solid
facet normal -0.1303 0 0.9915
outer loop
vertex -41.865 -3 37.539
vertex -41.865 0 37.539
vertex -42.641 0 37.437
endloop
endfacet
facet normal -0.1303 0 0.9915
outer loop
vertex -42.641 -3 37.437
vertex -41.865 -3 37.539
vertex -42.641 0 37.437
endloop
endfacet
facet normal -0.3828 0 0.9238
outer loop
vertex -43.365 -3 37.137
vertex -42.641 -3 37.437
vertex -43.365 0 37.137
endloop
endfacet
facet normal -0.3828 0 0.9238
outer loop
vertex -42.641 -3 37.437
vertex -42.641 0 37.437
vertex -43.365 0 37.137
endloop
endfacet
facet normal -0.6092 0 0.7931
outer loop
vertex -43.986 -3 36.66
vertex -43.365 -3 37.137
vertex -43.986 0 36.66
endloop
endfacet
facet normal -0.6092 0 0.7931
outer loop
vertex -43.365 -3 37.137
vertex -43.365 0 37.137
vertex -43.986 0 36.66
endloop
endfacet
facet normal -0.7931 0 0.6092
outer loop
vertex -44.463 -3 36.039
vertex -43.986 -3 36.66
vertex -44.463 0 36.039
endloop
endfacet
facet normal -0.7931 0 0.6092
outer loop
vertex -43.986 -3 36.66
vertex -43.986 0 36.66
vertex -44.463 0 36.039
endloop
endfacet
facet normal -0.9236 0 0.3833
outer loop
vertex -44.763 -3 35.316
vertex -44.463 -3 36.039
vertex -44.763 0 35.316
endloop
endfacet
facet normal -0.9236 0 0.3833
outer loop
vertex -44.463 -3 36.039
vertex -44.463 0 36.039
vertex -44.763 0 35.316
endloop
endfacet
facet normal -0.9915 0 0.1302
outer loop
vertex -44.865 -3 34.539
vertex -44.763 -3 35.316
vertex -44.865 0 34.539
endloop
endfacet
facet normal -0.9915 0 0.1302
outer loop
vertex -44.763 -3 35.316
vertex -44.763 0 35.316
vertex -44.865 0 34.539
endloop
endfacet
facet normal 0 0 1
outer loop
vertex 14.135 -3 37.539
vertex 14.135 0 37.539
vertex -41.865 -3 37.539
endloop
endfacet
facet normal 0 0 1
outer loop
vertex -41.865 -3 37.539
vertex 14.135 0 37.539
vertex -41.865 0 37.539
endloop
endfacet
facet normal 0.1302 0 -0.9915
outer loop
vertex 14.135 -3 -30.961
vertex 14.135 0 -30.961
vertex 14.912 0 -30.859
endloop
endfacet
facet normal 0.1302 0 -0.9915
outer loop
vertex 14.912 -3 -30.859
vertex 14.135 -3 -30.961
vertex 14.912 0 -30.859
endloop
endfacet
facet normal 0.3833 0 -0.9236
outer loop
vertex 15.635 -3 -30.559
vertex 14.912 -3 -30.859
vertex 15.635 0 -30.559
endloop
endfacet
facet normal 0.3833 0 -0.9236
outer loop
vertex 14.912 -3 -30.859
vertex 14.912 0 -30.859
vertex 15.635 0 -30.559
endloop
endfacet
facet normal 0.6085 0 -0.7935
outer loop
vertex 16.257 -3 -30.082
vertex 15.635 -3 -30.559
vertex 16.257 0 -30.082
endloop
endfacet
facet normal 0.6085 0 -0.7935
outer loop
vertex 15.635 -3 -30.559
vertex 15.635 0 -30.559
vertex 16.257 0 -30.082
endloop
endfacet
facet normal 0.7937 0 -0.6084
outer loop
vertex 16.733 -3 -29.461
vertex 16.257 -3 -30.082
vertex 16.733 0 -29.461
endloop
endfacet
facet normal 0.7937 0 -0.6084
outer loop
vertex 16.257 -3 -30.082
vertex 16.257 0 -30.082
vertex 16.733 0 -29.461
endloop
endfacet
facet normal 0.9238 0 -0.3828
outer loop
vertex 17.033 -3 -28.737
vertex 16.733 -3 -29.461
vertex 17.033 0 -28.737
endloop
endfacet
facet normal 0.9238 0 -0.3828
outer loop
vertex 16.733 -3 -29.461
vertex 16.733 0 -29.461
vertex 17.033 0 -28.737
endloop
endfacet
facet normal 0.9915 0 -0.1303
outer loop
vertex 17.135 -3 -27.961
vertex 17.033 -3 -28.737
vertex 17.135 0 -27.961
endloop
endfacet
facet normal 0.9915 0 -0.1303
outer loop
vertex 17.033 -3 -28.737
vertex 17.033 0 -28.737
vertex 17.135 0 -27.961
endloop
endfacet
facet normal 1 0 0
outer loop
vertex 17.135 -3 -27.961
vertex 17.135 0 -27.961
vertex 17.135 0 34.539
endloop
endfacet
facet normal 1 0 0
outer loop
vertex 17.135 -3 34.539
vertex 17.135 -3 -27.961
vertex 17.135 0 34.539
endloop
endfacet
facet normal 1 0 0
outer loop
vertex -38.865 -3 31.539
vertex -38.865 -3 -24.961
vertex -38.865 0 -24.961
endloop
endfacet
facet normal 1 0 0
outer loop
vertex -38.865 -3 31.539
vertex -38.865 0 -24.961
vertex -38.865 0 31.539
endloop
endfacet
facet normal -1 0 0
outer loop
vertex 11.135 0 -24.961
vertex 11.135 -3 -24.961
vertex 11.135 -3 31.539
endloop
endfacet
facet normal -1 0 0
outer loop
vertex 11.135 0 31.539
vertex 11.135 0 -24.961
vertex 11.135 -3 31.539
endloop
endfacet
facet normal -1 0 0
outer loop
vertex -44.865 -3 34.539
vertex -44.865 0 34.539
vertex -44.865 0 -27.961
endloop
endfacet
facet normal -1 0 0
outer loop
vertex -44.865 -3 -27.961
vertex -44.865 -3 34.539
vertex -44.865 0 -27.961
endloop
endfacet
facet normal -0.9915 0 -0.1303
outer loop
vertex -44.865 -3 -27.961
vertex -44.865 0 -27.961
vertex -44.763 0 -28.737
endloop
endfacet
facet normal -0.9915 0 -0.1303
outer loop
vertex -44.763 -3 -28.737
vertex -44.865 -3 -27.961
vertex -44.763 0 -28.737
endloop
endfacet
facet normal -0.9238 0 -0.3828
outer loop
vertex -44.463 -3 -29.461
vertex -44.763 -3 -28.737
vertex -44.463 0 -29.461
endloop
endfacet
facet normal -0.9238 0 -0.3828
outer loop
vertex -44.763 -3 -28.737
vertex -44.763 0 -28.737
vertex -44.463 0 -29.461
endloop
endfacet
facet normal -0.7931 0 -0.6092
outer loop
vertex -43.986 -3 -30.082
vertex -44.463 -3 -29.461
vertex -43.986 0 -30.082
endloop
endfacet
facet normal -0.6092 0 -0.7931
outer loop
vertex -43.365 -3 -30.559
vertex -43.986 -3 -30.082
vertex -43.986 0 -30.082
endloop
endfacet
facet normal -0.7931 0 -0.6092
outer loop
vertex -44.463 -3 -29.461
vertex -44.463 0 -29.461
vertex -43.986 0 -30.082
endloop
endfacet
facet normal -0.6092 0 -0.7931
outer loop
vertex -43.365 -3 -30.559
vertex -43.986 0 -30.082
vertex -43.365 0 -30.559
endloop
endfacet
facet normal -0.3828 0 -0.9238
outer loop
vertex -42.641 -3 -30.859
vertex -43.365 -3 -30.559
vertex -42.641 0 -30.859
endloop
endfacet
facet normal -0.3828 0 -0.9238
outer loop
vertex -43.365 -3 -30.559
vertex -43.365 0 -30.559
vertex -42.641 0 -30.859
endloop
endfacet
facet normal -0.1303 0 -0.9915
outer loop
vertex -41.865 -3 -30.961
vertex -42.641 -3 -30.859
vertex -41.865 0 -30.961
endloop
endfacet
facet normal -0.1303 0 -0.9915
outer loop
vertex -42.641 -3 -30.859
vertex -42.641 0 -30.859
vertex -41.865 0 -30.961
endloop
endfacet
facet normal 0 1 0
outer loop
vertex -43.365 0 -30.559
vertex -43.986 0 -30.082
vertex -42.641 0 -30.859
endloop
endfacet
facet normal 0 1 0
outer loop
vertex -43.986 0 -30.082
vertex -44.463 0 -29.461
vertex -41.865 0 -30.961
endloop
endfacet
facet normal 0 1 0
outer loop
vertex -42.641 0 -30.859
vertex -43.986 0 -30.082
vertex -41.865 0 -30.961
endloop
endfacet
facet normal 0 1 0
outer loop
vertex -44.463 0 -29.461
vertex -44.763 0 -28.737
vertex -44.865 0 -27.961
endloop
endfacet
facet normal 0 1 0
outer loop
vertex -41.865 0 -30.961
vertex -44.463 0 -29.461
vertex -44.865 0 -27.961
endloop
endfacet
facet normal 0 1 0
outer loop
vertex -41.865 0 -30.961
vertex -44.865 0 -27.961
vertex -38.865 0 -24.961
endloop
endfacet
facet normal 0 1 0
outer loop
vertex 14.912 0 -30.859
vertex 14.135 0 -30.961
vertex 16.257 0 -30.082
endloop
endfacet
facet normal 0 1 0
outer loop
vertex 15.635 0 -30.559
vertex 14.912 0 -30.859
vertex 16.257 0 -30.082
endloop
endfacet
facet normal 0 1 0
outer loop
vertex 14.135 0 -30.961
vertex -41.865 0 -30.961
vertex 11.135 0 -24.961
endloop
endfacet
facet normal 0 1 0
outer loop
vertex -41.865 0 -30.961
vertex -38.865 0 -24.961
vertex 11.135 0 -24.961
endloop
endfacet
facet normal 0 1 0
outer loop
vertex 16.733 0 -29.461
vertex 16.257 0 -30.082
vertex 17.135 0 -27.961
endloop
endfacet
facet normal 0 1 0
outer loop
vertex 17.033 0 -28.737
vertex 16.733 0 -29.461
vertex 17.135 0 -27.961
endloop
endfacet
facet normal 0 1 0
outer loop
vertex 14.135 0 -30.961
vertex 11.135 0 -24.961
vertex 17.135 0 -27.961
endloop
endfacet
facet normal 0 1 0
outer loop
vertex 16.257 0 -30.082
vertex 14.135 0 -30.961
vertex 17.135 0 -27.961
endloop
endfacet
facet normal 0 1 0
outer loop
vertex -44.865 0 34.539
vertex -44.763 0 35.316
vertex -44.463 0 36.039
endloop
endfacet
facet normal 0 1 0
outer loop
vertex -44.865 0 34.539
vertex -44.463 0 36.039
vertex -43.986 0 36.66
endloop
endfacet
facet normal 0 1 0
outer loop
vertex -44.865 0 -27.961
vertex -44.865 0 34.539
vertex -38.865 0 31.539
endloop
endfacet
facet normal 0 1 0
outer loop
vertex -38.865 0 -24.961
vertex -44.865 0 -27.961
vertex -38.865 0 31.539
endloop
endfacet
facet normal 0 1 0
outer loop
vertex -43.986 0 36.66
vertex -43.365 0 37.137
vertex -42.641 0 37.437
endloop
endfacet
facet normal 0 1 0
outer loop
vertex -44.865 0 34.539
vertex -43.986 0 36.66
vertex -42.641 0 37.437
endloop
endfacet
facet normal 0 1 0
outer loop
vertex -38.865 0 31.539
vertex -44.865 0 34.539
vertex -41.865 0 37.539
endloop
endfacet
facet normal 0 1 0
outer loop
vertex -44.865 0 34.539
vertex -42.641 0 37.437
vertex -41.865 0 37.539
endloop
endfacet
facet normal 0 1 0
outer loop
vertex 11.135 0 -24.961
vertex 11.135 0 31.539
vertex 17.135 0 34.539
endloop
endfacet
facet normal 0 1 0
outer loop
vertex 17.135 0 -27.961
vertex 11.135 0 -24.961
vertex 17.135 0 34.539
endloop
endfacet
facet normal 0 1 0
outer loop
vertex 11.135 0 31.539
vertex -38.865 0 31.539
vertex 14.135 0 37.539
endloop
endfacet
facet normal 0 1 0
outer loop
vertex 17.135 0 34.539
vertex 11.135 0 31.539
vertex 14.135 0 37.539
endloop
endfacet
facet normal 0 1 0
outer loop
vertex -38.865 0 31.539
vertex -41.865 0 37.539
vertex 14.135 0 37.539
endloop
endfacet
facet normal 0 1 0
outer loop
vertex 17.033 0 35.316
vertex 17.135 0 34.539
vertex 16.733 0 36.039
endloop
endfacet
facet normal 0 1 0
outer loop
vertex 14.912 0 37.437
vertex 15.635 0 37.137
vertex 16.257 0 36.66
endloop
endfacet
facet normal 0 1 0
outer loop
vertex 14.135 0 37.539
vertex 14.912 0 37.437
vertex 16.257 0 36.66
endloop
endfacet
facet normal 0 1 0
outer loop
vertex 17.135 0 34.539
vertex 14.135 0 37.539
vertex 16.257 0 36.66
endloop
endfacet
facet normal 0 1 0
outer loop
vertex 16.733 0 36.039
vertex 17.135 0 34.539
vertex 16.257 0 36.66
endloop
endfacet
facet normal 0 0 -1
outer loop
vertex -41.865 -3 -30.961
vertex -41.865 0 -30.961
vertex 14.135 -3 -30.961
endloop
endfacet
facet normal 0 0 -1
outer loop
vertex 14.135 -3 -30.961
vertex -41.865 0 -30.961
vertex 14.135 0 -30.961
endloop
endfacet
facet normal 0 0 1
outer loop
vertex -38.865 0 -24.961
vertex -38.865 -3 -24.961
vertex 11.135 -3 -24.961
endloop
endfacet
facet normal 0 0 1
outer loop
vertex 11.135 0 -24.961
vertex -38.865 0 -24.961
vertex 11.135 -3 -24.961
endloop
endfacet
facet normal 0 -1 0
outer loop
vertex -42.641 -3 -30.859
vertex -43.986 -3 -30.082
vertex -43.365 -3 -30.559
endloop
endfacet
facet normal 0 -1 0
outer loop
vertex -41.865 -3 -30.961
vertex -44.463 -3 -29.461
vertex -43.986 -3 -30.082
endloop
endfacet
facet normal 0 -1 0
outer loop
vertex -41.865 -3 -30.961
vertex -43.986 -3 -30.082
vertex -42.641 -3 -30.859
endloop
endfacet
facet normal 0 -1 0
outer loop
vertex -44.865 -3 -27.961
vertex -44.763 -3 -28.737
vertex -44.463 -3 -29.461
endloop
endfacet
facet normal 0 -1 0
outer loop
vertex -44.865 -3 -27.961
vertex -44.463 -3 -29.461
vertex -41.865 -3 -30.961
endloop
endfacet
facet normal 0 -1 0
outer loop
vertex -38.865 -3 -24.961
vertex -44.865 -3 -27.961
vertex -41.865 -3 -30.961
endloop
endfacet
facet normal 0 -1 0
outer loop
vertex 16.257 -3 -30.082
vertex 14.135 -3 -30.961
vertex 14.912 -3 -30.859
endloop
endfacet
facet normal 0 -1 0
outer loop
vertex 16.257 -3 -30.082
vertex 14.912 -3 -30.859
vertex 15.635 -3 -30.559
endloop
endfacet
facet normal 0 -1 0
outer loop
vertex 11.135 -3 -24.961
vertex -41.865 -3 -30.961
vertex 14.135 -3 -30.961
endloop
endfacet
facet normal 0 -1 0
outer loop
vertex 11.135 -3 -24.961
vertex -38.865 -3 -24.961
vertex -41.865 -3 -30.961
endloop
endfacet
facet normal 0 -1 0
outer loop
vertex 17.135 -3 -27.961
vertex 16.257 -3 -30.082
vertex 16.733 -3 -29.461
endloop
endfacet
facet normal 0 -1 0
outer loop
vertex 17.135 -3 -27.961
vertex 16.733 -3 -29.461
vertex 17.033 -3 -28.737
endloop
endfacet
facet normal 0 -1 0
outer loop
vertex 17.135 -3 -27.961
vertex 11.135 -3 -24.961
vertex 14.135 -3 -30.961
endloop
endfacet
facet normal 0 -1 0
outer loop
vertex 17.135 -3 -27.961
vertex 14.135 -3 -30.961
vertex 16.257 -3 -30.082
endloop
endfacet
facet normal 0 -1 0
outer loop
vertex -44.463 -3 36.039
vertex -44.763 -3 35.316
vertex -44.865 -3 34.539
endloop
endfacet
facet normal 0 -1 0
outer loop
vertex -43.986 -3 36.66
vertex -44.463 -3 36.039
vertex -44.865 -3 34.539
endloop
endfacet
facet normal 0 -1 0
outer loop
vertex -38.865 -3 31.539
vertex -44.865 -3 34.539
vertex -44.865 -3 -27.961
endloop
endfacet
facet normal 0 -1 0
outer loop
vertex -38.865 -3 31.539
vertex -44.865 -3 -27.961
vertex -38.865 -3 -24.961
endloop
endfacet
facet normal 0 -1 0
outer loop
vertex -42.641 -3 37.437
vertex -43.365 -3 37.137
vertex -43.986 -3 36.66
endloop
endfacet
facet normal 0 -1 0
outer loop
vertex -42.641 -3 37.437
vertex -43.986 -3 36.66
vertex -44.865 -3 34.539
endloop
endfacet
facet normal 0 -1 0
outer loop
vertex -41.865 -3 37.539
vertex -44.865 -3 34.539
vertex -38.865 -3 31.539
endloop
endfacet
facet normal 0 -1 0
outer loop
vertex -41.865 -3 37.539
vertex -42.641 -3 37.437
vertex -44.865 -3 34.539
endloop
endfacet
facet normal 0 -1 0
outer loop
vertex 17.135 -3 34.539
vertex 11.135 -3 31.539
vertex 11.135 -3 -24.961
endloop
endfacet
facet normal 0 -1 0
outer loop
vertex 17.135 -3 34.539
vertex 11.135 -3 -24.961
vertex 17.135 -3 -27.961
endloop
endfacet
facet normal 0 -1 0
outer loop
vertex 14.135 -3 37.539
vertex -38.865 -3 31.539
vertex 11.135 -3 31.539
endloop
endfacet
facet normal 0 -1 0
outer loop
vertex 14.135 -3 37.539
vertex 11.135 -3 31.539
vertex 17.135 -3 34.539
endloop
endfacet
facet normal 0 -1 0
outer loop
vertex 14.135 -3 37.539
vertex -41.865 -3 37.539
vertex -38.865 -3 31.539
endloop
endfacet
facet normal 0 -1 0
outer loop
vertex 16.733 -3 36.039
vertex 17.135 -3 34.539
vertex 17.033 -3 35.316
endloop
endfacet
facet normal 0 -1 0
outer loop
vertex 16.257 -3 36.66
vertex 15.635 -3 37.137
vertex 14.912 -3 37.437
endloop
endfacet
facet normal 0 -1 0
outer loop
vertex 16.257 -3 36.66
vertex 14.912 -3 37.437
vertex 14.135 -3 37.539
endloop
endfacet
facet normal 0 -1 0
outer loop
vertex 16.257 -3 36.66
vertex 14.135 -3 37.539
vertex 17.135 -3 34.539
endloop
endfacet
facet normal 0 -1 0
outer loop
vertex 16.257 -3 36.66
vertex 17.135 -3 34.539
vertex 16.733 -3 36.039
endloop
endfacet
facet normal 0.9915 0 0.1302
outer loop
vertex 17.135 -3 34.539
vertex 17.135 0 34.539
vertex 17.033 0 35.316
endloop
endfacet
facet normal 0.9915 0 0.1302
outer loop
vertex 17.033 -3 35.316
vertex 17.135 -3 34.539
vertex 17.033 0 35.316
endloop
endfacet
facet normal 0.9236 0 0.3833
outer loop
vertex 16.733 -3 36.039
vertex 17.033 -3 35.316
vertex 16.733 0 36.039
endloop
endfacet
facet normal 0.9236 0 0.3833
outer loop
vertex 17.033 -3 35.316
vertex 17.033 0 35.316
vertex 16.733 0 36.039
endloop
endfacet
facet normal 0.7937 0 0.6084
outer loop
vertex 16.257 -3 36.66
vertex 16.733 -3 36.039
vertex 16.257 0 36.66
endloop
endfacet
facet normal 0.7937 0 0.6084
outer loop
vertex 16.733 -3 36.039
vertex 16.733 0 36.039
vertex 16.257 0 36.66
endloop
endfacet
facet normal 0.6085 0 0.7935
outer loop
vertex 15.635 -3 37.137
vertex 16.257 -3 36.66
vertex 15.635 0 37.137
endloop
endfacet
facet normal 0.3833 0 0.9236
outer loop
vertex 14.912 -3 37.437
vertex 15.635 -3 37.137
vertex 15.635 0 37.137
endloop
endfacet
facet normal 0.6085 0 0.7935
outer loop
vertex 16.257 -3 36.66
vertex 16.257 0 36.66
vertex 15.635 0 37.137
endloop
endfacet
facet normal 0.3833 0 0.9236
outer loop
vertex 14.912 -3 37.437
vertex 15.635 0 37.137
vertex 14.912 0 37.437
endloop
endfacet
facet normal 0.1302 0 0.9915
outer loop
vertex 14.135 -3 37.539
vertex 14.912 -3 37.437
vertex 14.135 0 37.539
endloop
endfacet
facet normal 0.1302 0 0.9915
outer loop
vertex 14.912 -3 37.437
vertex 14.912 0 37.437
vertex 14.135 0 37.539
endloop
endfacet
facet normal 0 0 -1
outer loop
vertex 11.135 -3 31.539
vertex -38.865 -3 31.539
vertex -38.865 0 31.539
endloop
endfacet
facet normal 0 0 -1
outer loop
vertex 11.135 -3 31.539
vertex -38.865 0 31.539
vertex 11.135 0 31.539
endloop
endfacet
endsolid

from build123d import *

# Parameters (mm, degrees)
F1_DEPTH = 3
F2_W     = 50
F2_H     = 56.5
F3_DEPTH = 25


with BuildPart() as f1:
    # F0 (on Front) → F1 (new body)
    with BuildSketch(Plane.XZ):
        with BuildLine():
            Line((14.135233, 37.539159), (-41.864767, 37.539159))
            ThreePointArc((-41.864767, 37.539159), (-43.986087, 36.660479), (-44.864767, 34.539159))
            Line((-44.864767, 34.539159), (-44.864767, -27.960841))
            ThreePointArc((-44.864767, -27.960841), (-43.986087, -30.082161), (-41.864767, -30.960841))
            Line((-41.864767, -30.960841), (14.135233, -30.960841))
            ThreePointArc((14.135233, -30.960841), (16.256553, -30.082161), (17.135233, -27.960841))
            Line((17.135233, -27.960841), (17.135233, 34.539159))
            ThreePointArc((17.135233, 34.539159), (16.256553, 36.660479), (14.135233, 37.539159))
        make_face()
    extrude(amount=F1_DEPTH)

    # F2 (on face) → F3 (cut)
    with BuildSketch(Plane.XZ.offset(3)):
        with Locations((-13.864767, 3.289159)):
            Rectangle(F2_W, F2_H)
    extrude(amount=-F3_DEPTH, mode=Mode.SUBTRACT)


solid = f1.part
